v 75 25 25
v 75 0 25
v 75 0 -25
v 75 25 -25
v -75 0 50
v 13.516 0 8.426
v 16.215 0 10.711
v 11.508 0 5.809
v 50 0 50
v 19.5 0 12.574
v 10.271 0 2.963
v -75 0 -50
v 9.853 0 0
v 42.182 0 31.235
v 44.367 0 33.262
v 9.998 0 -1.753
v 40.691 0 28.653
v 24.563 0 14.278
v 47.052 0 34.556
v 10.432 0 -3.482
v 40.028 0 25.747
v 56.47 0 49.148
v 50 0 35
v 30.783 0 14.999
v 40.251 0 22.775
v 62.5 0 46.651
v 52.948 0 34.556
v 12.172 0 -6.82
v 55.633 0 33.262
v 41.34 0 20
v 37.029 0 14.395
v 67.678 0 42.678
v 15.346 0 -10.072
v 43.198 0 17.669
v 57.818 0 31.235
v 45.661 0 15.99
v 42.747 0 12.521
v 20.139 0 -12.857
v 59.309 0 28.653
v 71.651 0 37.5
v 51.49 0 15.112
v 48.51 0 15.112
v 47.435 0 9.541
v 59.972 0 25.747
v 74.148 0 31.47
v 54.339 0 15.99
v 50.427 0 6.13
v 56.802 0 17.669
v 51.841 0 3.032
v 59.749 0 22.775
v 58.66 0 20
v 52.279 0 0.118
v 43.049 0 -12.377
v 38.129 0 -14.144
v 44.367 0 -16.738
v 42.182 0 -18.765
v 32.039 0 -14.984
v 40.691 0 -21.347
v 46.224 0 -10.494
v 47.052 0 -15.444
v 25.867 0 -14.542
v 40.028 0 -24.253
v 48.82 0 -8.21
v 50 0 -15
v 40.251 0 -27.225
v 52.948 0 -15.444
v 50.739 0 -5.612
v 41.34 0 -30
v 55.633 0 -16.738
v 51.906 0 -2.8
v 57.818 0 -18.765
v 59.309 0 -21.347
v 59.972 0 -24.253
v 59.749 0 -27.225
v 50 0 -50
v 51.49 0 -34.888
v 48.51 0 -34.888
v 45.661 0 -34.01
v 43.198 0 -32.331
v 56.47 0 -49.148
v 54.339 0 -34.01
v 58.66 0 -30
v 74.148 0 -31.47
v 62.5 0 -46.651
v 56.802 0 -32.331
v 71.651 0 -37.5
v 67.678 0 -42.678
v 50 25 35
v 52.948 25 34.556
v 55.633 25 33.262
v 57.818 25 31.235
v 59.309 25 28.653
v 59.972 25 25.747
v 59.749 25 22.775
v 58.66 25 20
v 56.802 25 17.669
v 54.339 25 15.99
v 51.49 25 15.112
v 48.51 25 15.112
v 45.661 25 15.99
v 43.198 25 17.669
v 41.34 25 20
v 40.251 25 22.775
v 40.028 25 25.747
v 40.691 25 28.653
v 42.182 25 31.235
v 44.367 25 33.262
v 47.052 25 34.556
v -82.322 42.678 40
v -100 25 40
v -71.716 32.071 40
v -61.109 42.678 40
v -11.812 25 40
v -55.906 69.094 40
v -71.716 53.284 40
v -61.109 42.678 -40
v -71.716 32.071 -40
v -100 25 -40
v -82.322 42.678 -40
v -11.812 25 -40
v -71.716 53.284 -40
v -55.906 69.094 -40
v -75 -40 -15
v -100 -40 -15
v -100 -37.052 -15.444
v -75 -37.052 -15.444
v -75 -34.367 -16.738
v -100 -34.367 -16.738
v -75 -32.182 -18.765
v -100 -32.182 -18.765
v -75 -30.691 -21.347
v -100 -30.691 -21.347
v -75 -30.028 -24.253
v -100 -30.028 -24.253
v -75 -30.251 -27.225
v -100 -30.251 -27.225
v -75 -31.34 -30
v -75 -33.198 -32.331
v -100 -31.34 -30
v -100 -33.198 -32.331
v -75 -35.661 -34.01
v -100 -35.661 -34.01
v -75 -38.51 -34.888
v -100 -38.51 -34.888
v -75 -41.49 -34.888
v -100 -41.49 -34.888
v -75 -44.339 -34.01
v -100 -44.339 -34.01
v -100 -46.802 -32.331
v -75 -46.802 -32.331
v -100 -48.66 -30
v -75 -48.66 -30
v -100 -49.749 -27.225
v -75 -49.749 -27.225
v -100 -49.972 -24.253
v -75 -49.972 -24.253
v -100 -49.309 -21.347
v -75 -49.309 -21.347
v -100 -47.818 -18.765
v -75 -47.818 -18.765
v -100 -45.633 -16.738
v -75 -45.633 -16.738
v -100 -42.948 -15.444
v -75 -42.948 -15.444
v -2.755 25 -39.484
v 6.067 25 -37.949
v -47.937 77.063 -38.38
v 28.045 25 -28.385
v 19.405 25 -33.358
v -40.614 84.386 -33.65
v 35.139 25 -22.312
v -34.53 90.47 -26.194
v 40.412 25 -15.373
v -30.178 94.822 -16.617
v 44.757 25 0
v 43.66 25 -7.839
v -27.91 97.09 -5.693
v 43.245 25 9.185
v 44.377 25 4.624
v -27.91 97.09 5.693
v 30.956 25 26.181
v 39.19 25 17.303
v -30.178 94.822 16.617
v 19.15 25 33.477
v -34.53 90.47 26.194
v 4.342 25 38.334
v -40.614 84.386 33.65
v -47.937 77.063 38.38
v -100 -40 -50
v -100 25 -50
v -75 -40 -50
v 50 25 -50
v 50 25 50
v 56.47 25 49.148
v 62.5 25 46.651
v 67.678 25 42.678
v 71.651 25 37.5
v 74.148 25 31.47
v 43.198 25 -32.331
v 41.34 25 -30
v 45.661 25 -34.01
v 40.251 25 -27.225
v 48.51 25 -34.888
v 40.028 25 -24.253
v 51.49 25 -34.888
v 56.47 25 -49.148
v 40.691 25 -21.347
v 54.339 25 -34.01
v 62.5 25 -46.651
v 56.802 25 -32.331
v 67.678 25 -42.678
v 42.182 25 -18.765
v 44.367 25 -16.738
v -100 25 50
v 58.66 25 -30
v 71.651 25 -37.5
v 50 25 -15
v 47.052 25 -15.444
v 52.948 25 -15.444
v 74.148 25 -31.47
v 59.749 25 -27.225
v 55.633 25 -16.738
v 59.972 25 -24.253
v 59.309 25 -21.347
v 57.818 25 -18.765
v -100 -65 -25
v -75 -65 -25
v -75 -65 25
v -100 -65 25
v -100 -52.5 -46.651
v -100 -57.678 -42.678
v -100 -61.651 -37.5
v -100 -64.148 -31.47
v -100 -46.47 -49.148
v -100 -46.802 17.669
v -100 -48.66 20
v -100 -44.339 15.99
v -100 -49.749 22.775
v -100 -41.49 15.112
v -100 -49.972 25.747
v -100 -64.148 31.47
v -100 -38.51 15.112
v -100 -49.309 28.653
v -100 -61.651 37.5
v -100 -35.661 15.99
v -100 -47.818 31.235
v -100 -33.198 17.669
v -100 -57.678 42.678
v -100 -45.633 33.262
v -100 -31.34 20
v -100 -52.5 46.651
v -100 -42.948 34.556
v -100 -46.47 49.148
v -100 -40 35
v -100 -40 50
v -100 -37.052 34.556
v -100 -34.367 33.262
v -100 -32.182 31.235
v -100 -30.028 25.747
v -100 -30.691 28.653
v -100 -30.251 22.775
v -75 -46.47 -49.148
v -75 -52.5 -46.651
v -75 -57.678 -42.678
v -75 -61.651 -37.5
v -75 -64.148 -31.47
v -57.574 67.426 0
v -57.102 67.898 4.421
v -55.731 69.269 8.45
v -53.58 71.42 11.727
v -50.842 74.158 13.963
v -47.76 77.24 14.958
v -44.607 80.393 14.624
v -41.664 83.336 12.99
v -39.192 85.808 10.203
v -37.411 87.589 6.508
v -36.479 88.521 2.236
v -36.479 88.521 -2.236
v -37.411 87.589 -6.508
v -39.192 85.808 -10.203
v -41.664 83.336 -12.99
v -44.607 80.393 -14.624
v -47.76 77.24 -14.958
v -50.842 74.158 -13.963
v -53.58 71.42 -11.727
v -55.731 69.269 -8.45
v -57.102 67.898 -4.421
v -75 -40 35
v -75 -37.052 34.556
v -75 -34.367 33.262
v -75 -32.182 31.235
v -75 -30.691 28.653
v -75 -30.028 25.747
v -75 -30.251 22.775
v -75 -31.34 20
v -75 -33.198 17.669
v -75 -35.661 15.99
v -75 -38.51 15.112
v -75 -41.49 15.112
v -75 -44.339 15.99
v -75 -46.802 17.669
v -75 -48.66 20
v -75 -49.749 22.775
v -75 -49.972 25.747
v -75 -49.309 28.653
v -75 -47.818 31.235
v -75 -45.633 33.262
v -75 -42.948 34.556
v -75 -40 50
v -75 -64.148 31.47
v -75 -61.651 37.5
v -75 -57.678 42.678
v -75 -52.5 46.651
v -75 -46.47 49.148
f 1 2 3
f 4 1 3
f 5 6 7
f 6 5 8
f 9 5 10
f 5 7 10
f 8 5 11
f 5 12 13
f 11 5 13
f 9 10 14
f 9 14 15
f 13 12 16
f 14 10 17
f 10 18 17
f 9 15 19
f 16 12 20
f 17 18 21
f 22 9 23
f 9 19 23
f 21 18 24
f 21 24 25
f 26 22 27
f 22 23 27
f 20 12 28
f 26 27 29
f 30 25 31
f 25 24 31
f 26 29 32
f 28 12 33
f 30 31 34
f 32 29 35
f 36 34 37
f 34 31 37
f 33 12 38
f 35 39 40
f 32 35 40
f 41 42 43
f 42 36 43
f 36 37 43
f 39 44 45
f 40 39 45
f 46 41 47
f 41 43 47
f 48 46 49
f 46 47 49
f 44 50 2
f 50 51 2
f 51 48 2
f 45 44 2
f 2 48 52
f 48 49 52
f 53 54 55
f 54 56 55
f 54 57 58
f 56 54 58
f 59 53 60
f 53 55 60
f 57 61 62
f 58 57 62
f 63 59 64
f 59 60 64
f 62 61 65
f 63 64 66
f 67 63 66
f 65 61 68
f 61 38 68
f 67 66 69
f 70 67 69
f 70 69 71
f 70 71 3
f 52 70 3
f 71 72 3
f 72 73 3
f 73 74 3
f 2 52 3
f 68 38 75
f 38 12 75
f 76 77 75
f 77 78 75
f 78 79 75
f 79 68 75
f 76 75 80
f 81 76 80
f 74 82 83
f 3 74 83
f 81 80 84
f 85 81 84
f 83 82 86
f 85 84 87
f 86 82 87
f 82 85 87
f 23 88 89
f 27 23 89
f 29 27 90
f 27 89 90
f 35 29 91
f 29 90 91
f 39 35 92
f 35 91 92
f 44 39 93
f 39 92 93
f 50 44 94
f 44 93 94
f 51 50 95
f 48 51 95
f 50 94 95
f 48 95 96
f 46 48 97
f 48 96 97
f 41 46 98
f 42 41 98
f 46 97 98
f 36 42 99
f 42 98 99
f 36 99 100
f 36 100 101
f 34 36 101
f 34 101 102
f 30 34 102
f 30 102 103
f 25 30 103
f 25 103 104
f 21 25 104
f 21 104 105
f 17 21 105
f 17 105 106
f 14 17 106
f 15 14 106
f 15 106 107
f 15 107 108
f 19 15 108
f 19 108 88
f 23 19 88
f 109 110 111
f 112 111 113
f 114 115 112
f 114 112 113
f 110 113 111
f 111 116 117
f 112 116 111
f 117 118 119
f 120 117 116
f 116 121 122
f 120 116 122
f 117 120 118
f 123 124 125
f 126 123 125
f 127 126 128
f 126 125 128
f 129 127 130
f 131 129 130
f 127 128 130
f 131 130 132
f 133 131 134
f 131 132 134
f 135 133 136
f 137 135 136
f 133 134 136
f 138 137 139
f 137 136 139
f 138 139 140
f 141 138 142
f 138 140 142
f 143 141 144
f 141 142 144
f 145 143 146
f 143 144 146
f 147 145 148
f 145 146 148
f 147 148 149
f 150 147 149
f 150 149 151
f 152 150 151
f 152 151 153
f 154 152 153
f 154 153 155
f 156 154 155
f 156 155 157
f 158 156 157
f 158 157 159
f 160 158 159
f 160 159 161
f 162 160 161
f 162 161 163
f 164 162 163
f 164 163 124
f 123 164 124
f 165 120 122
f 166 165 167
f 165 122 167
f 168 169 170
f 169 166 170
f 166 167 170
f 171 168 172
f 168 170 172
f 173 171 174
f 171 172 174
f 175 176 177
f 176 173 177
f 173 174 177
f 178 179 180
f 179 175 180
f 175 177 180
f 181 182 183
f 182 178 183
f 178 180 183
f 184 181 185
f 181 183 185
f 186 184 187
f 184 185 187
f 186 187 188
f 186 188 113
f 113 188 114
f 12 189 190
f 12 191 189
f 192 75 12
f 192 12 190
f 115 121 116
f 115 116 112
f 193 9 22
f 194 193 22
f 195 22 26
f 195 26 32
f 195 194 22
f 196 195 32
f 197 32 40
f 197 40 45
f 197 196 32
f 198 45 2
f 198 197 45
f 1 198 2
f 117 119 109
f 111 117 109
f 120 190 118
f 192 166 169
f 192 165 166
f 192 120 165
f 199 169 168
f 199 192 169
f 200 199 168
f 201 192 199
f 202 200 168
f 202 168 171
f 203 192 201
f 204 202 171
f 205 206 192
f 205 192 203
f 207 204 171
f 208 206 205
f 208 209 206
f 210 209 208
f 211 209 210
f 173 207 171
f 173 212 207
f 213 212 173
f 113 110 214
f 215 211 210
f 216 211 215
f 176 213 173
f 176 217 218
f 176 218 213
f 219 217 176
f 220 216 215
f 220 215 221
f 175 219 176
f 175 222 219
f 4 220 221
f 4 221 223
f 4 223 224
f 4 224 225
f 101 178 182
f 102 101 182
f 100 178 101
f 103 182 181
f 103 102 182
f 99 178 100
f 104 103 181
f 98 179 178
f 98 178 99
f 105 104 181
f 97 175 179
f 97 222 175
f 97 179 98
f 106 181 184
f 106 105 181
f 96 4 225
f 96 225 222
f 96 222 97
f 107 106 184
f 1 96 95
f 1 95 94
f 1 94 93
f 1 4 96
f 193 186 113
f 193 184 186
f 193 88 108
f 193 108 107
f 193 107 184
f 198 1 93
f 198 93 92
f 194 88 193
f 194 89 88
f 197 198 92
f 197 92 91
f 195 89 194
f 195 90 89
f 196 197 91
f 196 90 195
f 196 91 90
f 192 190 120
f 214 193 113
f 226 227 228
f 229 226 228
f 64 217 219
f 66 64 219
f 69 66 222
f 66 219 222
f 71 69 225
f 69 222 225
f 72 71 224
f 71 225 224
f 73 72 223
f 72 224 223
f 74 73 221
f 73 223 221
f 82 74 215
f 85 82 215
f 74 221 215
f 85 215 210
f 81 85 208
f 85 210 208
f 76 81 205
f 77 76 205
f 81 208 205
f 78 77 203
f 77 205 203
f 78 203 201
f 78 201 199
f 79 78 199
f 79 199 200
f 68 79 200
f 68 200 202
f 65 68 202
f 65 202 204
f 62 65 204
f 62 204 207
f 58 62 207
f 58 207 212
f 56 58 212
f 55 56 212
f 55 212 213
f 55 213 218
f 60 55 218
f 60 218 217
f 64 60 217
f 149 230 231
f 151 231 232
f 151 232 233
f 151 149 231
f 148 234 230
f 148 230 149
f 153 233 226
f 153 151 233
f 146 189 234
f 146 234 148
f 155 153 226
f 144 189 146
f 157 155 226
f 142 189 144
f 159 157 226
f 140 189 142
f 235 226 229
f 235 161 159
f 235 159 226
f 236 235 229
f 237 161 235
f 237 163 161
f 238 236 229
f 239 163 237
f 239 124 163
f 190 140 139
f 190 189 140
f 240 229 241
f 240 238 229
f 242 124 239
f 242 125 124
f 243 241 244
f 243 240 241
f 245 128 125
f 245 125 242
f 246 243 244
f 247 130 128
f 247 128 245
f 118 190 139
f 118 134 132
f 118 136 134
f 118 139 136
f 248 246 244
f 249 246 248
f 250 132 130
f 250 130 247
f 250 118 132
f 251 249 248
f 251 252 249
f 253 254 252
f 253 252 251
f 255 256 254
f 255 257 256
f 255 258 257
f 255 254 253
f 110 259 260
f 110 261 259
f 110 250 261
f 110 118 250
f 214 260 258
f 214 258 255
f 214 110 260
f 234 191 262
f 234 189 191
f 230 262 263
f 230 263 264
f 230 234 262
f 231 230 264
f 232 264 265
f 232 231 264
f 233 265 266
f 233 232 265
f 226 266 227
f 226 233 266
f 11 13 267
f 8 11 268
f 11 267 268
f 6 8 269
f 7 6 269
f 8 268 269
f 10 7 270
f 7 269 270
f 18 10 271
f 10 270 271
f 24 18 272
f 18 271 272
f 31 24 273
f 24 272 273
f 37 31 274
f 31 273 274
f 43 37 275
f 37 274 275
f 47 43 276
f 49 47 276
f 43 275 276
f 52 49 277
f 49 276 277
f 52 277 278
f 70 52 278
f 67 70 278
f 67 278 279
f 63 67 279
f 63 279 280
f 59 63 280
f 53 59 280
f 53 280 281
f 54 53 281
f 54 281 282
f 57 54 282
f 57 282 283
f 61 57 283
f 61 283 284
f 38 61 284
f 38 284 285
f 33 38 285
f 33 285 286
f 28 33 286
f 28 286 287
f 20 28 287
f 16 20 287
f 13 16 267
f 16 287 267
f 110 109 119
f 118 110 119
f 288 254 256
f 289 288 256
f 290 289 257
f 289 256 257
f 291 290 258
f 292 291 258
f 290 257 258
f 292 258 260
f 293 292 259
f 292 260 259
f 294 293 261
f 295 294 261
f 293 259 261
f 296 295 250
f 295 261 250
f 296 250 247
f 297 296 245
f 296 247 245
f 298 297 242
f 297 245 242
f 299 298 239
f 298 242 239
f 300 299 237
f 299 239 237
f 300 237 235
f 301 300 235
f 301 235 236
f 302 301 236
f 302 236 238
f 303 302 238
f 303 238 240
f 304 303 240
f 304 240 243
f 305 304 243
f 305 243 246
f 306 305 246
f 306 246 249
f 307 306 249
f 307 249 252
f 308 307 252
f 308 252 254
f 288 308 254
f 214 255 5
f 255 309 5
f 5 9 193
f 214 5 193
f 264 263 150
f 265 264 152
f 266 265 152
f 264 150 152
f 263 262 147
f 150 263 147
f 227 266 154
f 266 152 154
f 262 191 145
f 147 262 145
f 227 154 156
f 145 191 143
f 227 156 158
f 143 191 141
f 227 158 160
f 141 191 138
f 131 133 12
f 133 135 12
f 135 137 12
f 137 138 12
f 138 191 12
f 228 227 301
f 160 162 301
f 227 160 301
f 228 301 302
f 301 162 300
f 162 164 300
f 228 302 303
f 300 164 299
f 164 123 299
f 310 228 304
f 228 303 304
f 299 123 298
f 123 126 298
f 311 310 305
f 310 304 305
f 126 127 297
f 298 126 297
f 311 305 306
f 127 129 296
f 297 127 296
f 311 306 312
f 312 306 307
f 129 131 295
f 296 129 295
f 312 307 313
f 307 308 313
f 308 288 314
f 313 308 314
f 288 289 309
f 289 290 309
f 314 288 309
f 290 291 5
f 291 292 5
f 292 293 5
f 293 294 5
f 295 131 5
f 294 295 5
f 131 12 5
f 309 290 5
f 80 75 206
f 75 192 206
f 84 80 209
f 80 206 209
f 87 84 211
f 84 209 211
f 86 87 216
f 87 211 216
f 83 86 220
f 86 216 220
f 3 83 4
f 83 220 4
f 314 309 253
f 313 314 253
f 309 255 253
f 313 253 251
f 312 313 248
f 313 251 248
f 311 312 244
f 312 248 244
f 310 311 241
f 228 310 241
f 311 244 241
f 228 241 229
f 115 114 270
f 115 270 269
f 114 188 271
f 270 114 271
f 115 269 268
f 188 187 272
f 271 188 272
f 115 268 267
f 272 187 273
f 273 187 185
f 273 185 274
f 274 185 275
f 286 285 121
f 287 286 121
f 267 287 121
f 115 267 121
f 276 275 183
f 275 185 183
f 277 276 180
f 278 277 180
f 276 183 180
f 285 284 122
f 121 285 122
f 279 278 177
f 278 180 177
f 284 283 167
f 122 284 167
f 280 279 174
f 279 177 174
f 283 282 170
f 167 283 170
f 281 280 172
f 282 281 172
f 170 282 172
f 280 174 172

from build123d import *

# Parameters (mm, degrees)
SKETCH1_W           = 150
SKETCH1_H           = 100
BOSS_EXTRUDE1_DEPTH = 25
SKETCH2_W           = 100
SKETCH2_H           = 90
BOSS_EXTRUDE2_DEPTH = 25
FILLET1_R           = 25
BOSS_EXTRUDE3_REACH = 196.068
SKETCH5_W           = 80
SKETCH5_H           = 102.358362639
SKETCH6_W           = 80
SKETCH6_H           = 15
CUT_EXTRUDE1_DEPTH  = 15
SKETCH7_R           = 15
CUT_EXTRUDE2_DEPTH  = 195.068286951
SKETCH8_R           = 10
CUT_EXTRUDE3_DEPTH  = 144.527000944
SKETCH9_R           = 10
CUT_EXTRUDE4_DEPTH  = 207.415919487
FILLET4_R           = 40


with BuildPart() as part:
    # Sketch1 → Boss-Extrude1 (new body)
    with BuildSketch(Plane(origin=(0, 0, 0), x_dir=(1, 0, 0), z_dir=(0, 1, 0))):
        Rectangle(SKETCH1_W, SKETCH1_H)
    extrude(amount=BOSS_EXTRUDE1_DEPTH)

    # Sketch2 → Boss-Extrude2 (add)
    with BuildSketch(Plane.ZY.offset(75)):
        with Locations((0, -20)):
            Rectangle(SKETCH2_W, SKETCH2_H)
    extrude(amount=BOSS_EXTRUDE2_DEPTH)

    # Fillet1
    fillet1_edges = [part.edges().sort_by_distance(p)[0] for p in [
        (-87.5, -65, -50),
        (-87.5, -65, 50),
        (75, 12.5, 50),
        (75, 12.5, -50),
    ]]
    fillet(fillet1_edges, radius=FILLET1_R)

    # Sketch5 → Boss-Extrude3 (add, up to next)
    with BuildSketch(Plane(origin=(-62.5, 62.5, 0), x_dir=(0, 0, -1), z_dir=(0.7071067811865438, -0.7071067811865512, 0)), mode=Mode.PRIVATE) as boss_extrude3_sk1:
        with Locations((0, -1.85382727)):
            Rectangle(SKETCH5_W, SKETCH5_H)
    boss_extrude3_tool1 = extrude(boss_extrude3_sk1.sketch, amount=BOSS_EXTRUDE3_REACH, mode=Mode.PRIVATE) - part.part
    add(boss_extrude3_tool1.solids().sort_by_distance((-63.810854, 61.189146, 0))[0])

    # Sketch6 → Cut-Extrude1 (cut)
    with BuildSketch(Plane(origin=(-62.5, 62.5, 0), x_dir=(0, 0, 1), z_dir=(-0.7071067811865438, 0.7071067811865513, 0))):
        with Locations((0, -20.533008589)):
            Rectangle(SKETCH6_W, SKETCH6_H)
    extrude(amount=-CUT_EXTRUDE1_DEPTH, mode=Mode.SUBTRACT)

    # Sketch7 → Cut-Extrude2 (cut, through all)
    with BuildSketch(Plane(origin=(-62.5, 62.5, 0), x_dir=(0.7071067811865513, 0.7071067811865438, 0), z_dir=(-0.7071067811865438, 0.7071067811865513, 0))):
        with Locations(Location((21.966991411, 0, 0), (0, 0, 180))):
            Circle(SKETCH7_R)
    extrude(amount=-CUT_EXTRUDE2_DEPTH, mode=Mode.SUBTRACT)

    # Sketch8 → Cut-Extrude3 (cut, through all)
    with BuildSketch(Plane(origin=(0, 25, 0), x_dir=(1, 0, 0), z_dir=(0, 1, 0))):
        with Locations(Location((50, 25, 0), (0, 0, 270))):
            Circle(SKETCH8_R)
        with Locations(Location((50, -25, 0), (0, 0, 270))):
            Circle(SKETCH8_R)
    extrude(amount=-CUT_EXTRUDE3_DEPTH, mode=Mode.SUBTRACT)

    # Sketch9 → Cut-Extrude4 (cut, through all)
    with BuildSketch(Plane.ZY.offset(100)):
        with Locations((-25, -40)):
            Circle(SKETCH9_R)
        with Locations((25, -40)):
            Circle(SKETCH9_R)
    extrude(amount=-CUT_EXTRUDE4_DEPTH, mode=Mode.SUBTRACT)

    # Fillet4
    # the kernel refuses this fillet: 40 mm, written as the material it takes off along each edge
    with BuildSketch(Plane(origin=(-98.332385785, 168.088970452, -40), x_dir=(-0.7071067811865511, -0.7071067811865437, 0), z_dir=(0.7071067811865438, -0.7071067811865512, 0))) as fillet4_piece_1_section:
        with BuildLine():
            CenterArc((FILLET4_R, -FILLET4_R), FILLET4_R, 90, 90)
            Line((0, -FILLET4_R), (0, 0))
            Line((0, 0), (FILLET4_R, 0))
        make_face()
    fillet4_piece_1 = extrude(amount=302.358362639, mode=Mode.PRIVATE)
    fillet4_piece_1 = split(fillet4_piece_1, bisect_by=Plane(origin=(-0.418025546, 25, -30.730970788), z_dir=(0, 1, 0)), keep=Keep.TOP, mode=Mode.PRIVATE)
    add(fillet4_piece_1, mode=Mode.SUBTRACT)
    with BuildSketch(Plane(origin=(-98.332385785, 168.088970452, 40), x_dir=(0, 0, -1), z_dir=(0.7071067811865438, -0.7071067811865512, 0))) as fillet4_piece_2_section:
        with BuildLine():
            CenterArc((FILLET4_R, -FILLET4_R), FILLET4_R, 90, 90)
            Line((0, -FILLET4_R), (0, 0))
            Line((0, 0), (FILLET4_R, 0))
        make_face()
    fillet4_piece_2 = extrude(amount=302.358362639, mode=Mode.PRIVATE)
    fillet4_piece_2 = split(fillet4_piece_2, bisect_by=Plane(origin=(-0.418025546, 25, 30.730970789), z_dir=(0, 1, 0)), keep=Keep.TOP, mode=Mode.PRIVATE)
    add(fillet4_piece_2, mode=Mode.SUBTRACT)


solid = part.part
